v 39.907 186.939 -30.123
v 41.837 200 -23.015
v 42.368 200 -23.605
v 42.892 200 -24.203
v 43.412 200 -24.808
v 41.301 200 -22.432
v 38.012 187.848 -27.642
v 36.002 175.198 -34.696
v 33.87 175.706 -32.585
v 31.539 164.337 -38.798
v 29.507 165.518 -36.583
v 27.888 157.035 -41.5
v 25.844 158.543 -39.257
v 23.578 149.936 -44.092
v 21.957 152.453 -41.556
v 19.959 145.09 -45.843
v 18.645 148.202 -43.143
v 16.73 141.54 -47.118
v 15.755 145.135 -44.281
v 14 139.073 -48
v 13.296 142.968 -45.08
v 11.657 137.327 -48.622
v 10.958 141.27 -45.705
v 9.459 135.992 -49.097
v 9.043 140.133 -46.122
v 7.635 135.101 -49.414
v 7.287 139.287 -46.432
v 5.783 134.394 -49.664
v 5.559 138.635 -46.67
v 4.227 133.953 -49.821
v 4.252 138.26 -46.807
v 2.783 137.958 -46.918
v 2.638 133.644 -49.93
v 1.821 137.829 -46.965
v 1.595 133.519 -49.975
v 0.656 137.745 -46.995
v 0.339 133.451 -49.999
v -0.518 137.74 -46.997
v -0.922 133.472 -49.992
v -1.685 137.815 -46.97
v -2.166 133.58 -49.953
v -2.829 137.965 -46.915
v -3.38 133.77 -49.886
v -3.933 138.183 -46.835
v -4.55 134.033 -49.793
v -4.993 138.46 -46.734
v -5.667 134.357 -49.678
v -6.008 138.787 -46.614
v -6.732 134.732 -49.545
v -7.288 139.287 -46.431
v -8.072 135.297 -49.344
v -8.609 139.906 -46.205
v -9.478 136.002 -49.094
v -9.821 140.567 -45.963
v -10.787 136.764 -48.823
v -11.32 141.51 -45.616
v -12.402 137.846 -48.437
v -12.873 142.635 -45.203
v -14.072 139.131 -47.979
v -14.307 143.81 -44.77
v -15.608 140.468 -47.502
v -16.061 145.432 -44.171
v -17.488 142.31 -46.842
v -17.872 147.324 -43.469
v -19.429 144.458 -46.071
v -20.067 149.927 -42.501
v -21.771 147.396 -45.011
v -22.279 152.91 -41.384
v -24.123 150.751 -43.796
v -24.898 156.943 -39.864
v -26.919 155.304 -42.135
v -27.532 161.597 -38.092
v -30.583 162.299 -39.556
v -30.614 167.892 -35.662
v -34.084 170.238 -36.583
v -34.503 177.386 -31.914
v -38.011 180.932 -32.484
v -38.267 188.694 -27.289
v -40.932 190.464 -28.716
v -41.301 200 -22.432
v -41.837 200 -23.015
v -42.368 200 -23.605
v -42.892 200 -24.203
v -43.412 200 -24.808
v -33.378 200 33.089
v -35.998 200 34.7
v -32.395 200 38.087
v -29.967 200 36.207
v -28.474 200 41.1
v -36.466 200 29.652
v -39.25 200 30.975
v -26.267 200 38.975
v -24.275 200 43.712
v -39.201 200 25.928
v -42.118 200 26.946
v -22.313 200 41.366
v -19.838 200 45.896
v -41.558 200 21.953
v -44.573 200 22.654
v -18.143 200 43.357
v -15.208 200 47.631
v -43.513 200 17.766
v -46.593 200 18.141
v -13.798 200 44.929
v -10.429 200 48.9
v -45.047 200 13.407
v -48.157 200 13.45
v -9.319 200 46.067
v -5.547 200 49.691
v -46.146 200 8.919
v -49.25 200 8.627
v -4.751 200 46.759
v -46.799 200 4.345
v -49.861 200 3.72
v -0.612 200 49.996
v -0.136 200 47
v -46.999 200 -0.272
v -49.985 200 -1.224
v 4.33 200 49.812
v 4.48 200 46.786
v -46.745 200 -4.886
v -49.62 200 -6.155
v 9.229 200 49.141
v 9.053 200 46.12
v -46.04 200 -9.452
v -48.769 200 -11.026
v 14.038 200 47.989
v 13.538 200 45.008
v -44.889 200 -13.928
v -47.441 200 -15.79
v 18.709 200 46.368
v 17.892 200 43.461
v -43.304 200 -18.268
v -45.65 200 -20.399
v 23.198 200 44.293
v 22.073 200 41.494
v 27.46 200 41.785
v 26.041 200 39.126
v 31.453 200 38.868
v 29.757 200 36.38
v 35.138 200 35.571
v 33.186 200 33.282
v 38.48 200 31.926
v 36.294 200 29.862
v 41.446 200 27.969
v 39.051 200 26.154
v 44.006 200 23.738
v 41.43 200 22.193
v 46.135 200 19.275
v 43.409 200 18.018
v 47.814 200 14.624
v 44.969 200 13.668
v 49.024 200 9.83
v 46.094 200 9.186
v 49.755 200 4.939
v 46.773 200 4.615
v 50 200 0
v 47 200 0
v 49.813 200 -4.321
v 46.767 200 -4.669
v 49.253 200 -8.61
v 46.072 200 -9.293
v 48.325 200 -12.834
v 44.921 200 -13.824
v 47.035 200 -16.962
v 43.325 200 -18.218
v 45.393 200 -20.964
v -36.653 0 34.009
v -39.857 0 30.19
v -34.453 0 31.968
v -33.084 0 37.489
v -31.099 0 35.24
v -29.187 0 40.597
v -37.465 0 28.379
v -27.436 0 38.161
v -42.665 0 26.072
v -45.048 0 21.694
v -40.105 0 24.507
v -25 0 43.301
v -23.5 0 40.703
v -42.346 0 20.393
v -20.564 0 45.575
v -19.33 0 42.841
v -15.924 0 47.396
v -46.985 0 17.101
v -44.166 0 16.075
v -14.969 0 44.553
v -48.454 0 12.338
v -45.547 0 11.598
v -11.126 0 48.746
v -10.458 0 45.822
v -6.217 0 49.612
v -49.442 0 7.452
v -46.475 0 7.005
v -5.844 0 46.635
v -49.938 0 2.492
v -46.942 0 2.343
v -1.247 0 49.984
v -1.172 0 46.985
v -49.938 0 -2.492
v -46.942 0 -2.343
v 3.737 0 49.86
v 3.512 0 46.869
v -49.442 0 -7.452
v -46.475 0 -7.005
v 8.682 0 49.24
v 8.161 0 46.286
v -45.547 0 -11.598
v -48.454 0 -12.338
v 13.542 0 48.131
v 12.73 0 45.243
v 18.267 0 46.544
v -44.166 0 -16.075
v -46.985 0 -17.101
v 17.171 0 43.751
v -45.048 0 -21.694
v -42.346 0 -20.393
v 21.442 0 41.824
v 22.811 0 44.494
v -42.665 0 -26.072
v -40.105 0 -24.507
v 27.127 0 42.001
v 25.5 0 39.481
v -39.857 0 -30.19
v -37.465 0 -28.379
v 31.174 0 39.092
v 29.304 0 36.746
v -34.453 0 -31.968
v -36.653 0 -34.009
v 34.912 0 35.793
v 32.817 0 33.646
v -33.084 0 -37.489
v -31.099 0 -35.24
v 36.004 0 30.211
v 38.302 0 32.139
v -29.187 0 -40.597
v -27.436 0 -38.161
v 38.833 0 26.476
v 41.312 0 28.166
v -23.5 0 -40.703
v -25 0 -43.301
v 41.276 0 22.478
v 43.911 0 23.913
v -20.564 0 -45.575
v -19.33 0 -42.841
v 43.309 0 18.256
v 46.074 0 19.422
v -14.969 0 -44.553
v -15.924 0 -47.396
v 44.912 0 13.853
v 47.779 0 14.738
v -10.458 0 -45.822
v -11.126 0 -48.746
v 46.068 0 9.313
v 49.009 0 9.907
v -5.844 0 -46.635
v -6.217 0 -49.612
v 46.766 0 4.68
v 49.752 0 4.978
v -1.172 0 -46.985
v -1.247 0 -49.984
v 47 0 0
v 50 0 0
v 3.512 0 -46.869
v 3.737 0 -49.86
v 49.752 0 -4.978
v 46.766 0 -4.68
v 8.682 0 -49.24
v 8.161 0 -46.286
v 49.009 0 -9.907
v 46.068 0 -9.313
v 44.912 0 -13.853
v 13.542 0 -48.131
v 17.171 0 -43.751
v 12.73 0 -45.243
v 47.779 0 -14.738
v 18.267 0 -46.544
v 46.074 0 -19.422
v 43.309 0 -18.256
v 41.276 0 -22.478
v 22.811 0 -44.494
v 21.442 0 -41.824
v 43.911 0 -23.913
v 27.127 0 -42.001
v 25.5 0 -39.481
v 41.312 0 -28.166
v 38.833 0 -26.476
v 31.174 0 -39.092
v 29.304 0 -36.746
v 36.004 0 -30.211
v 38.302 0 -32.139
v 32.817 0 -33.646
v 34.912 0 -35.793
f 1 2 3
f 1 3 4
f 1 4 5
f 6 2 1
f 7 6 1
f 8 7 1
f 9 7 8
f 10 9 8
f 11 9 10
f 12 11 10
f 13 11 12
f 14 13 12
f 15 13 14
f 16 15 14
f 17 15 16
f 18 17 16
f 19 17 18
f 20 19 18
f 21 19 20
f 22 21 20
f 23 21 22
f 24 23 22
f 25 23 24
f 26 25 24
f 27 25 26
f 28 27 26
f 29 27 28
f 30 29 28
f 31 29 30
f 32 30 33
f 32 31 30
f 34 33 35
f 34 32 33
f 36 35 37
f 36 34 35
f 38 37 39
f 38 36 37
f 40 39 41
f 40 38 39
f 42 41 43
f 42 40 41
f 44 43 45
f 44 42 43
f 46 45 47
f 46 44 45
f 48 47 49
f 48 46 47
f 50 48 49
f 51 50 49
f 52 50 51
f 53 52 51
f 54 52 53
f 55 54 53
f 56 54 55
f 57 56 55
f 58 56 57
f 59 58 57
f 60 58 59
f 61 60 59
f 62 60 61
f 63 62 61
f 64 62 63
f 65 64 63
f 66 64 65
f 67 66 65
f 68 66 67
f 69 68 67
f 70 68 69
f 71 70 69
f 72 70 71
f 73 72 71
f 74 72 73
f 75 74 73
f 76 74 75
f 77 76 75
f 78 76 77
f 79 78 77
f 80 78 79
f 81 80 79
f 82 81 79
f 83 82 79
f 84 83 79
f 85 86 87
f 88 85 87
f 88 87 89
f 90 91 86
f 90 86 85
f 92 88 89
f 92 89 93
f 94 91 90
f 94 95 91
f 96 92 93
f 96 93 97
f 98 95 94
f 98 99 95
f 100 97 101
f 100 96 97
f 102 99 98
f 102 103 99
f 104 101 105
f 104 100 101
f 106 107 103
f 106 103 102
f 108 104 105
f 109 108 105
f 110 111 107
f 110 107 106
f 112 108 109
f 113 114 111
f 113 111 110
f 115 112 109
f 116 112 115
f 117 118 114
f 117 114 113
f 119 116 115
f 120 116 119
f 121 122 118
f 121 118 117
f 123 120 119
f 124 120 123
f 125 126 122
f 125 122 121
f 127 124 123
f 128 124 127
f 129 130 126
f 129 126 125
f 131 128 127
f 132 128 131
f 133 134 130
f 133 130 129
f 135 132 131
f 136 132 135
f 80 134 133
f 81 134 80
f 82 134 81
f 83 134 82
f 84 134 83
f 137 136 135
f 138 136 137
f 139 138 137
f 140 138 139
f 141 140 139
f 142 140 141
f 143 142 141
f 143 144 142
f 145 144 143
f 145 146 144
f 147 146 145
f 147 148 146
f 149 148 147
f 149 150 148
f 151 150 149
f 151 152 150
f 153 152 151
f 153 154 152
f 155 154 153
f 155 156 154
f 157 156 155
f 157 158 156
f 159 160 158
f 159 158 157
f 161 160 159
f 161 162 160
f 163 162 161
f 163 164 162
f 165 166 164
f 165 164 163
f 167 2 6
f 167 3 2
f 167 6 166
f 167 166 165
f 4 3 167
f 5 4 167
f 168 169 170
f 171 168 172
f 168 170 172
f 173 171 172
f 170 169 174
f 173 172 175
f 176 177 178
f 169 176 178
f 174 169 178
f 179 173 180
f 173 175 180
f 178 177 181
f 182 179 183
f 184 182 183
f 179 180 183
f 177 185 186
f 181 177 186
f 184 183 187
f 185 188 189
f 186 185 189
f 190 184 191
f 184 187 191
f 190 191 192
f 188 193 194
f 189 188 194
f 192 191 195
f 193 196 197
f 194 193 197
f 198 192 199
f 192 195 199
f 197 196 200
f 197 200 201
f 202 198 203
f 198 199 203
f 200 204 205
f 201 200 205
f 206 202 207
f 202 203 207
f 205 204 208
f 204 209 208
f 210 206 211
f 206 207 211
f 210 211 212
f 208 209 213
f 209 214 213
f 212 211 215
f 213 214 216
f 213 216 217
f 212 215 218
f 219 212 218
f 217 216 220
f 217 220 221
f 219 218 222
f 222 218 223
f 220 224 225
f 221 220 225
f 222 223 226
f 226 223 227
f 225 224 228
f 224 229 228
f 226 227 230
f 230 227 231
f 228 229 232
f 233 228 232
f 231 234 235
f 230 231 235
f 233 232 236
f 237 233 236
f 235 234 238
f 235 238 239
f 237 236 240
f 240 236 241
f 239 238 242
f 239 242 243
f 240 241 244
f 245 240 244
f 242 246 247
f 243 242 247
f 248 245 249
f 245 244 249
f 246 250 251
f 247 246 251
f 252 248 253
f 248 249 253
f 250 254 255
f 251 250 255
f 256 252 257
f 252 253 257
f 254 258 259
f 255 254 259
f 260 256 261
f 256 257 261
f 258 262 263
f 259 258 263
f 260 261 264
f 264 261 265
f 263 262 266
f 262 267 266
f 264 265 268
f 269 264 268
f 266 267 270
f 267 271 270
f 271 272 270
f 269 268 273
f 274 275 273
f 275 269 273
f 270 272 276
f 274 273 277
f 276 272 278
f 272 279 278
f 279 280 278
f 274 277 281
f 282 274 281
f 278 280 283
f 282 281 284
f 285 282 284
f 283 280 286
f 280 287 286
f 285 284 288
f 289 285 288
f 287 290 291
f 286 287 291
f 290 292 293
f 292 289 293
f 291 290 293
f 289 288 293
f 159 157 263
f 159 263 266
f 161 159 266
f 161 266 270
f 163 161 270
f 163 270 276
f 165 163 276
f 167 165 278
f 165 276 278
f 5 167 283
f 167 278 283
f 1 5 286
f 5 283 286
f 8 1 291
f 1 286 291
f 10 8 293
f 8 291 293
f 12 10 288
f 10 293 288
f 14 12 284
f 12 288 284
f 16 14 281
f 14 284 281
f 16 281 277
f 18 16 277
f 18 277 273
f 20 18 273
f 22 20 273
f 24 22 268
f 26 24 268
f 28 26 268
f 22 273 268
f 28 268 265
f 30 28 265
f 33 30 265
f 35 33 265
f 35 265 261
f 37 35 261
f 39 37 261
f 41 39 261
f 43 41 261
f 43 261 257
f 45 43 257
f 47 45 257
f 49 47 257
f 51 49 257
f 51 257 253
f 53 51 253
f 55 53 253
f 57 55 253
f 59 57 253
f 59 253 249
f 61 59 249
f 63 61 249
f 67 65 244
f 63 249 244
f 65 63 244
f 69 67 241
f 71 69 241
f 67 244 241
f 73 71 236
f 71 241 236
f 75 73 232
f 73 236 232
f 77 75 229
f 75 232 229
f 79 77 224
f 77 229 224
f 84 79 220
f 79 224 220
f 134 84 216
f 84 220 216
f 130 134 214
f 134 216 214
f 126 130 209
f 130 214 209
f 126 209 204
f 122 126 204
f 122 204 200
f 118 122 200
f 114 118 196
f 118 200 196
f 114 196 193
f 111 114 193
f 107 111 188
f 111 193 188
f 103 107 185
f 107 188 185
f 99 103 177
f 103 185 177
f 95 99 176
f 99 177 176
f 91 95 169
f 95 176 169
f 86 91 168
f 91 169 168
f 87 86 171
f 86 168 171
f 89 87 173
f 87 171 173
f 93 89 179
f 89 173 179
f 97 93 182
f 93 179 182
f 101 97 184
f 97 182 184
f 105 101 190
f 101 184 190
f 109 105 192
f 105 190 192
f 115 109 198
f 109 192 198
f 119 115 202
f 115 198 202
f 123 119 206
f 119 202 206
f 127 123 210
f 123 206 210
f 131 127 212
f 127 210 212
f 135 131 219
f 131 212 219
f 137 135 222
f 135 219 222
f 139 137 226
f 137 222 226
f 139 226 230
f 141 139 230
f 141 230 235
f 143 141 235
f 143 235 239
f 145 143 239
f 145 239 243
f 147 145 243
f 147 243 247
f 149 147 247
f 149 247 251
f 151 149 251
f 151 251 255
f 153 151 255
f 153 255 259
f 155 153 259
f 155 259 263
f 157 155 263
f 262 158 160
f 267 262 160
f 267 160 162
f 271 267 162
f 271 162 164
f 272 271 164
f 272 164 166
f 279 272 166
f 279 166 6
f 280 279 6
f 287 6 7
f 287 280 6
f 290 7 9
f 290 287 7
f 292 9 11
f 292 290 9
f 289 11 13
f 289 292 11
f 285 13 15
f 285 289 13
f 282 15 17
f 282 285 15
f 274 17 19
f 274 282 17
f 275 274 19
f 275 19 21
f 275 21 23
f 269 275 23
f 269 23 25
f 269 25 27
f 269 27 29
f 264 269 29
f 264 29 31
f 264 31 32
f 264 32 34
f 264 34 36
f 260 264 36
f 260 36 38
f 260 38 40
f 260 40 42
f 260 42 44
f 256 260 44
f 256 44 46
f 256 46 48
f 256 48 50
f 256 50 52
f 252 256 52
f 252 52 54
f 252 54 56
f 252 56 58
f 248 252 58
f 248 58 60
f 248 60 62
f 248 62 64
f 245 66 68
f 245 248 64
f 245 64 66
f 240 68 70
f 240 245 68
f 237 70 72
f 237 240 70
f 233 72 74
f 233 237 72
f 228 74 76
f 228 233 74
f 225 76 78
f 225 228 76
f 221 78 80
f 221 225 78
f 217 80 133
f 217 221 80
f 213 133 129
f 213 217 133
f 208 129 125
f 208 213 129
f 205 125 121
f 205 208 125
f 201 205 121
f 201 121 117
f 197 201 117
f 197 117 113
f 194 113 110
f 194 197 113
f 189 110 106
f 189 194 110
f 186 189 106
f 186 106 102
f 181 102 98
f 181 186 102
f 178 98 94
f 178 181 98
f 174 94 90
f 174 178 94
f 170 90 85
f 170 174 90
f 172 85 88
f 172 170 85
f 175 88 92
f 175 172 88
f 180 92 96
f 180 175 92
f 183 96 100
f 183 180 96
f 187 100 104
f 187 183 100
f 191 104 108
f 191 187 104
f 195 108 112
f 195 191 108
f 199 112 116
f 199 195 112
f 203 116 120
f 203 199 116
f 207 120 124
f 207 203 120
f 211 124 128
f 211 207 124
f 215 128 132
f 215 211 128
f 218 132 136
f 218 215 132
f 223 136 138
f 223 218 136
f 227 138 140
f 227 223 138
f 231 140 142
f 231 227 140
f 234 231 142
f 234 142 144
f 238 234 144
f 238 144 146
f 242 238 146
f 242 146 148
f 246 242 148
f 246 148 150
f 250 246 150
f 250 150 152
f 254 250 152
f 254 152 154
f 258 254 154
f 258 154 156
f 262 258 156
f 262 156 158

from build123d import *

# Parameters (mm, degrees)
EXTRUDE_1_OUTLINE_R      = 50
EXTRUDE_1_OUTLINE_R_2    = 47
EXTRUDE_1_DEPTH          = 200
CUT_EXTRUDE_1_DEPTH      = 213.132034356
CUT_EXTRUDE_1_DEPTH_BACK = 213.132034356
SKETCH_2_R               = 62.5


# Read off the part's stored shape, not the designer's step: Вытянуть-Тонкостенный1
with BuildPart() as part:
    # Вытянуть-Тонкостенный1 outline → Вытянуть-Тонкостенный1 (new body)
    with BuildSketch(Plane(origin=(0, 0, 0), x_dir=(1, 0, 0), z_dir=(0, 1, 0))):
        Circle(EXTRUDE_1_OUTLINE_R)
        Circle(EXTRUDE_1_OUTLINE_R_2, mode=Mode.SUBTRACT)
    extrude(amount=EXTRUDE_1_DEPTH)

    # Эскиз2 → Вырез-Вытянуть1 (cut, two sides: drawn at the far end of the back side and taken through both)
    with BuildSketch(Plane(origin=(0, 0, 0), x_dir=(1, 0, 0), z_dir=(0, -0.819152044288991, -0.5735764363510473)).offset(-CUT_EXTRUDE_1_DEPTH_BACK)):
        with Locations((0, -180)):
            Circle(SKETCH_2_R)
    extrude(amount=CUT_EXTRUDE_1_DEPTH + CUT_EXTRUDE_1_DEPTH_BACK, mode=Mode.SUBTRACT)


solid = part.part
